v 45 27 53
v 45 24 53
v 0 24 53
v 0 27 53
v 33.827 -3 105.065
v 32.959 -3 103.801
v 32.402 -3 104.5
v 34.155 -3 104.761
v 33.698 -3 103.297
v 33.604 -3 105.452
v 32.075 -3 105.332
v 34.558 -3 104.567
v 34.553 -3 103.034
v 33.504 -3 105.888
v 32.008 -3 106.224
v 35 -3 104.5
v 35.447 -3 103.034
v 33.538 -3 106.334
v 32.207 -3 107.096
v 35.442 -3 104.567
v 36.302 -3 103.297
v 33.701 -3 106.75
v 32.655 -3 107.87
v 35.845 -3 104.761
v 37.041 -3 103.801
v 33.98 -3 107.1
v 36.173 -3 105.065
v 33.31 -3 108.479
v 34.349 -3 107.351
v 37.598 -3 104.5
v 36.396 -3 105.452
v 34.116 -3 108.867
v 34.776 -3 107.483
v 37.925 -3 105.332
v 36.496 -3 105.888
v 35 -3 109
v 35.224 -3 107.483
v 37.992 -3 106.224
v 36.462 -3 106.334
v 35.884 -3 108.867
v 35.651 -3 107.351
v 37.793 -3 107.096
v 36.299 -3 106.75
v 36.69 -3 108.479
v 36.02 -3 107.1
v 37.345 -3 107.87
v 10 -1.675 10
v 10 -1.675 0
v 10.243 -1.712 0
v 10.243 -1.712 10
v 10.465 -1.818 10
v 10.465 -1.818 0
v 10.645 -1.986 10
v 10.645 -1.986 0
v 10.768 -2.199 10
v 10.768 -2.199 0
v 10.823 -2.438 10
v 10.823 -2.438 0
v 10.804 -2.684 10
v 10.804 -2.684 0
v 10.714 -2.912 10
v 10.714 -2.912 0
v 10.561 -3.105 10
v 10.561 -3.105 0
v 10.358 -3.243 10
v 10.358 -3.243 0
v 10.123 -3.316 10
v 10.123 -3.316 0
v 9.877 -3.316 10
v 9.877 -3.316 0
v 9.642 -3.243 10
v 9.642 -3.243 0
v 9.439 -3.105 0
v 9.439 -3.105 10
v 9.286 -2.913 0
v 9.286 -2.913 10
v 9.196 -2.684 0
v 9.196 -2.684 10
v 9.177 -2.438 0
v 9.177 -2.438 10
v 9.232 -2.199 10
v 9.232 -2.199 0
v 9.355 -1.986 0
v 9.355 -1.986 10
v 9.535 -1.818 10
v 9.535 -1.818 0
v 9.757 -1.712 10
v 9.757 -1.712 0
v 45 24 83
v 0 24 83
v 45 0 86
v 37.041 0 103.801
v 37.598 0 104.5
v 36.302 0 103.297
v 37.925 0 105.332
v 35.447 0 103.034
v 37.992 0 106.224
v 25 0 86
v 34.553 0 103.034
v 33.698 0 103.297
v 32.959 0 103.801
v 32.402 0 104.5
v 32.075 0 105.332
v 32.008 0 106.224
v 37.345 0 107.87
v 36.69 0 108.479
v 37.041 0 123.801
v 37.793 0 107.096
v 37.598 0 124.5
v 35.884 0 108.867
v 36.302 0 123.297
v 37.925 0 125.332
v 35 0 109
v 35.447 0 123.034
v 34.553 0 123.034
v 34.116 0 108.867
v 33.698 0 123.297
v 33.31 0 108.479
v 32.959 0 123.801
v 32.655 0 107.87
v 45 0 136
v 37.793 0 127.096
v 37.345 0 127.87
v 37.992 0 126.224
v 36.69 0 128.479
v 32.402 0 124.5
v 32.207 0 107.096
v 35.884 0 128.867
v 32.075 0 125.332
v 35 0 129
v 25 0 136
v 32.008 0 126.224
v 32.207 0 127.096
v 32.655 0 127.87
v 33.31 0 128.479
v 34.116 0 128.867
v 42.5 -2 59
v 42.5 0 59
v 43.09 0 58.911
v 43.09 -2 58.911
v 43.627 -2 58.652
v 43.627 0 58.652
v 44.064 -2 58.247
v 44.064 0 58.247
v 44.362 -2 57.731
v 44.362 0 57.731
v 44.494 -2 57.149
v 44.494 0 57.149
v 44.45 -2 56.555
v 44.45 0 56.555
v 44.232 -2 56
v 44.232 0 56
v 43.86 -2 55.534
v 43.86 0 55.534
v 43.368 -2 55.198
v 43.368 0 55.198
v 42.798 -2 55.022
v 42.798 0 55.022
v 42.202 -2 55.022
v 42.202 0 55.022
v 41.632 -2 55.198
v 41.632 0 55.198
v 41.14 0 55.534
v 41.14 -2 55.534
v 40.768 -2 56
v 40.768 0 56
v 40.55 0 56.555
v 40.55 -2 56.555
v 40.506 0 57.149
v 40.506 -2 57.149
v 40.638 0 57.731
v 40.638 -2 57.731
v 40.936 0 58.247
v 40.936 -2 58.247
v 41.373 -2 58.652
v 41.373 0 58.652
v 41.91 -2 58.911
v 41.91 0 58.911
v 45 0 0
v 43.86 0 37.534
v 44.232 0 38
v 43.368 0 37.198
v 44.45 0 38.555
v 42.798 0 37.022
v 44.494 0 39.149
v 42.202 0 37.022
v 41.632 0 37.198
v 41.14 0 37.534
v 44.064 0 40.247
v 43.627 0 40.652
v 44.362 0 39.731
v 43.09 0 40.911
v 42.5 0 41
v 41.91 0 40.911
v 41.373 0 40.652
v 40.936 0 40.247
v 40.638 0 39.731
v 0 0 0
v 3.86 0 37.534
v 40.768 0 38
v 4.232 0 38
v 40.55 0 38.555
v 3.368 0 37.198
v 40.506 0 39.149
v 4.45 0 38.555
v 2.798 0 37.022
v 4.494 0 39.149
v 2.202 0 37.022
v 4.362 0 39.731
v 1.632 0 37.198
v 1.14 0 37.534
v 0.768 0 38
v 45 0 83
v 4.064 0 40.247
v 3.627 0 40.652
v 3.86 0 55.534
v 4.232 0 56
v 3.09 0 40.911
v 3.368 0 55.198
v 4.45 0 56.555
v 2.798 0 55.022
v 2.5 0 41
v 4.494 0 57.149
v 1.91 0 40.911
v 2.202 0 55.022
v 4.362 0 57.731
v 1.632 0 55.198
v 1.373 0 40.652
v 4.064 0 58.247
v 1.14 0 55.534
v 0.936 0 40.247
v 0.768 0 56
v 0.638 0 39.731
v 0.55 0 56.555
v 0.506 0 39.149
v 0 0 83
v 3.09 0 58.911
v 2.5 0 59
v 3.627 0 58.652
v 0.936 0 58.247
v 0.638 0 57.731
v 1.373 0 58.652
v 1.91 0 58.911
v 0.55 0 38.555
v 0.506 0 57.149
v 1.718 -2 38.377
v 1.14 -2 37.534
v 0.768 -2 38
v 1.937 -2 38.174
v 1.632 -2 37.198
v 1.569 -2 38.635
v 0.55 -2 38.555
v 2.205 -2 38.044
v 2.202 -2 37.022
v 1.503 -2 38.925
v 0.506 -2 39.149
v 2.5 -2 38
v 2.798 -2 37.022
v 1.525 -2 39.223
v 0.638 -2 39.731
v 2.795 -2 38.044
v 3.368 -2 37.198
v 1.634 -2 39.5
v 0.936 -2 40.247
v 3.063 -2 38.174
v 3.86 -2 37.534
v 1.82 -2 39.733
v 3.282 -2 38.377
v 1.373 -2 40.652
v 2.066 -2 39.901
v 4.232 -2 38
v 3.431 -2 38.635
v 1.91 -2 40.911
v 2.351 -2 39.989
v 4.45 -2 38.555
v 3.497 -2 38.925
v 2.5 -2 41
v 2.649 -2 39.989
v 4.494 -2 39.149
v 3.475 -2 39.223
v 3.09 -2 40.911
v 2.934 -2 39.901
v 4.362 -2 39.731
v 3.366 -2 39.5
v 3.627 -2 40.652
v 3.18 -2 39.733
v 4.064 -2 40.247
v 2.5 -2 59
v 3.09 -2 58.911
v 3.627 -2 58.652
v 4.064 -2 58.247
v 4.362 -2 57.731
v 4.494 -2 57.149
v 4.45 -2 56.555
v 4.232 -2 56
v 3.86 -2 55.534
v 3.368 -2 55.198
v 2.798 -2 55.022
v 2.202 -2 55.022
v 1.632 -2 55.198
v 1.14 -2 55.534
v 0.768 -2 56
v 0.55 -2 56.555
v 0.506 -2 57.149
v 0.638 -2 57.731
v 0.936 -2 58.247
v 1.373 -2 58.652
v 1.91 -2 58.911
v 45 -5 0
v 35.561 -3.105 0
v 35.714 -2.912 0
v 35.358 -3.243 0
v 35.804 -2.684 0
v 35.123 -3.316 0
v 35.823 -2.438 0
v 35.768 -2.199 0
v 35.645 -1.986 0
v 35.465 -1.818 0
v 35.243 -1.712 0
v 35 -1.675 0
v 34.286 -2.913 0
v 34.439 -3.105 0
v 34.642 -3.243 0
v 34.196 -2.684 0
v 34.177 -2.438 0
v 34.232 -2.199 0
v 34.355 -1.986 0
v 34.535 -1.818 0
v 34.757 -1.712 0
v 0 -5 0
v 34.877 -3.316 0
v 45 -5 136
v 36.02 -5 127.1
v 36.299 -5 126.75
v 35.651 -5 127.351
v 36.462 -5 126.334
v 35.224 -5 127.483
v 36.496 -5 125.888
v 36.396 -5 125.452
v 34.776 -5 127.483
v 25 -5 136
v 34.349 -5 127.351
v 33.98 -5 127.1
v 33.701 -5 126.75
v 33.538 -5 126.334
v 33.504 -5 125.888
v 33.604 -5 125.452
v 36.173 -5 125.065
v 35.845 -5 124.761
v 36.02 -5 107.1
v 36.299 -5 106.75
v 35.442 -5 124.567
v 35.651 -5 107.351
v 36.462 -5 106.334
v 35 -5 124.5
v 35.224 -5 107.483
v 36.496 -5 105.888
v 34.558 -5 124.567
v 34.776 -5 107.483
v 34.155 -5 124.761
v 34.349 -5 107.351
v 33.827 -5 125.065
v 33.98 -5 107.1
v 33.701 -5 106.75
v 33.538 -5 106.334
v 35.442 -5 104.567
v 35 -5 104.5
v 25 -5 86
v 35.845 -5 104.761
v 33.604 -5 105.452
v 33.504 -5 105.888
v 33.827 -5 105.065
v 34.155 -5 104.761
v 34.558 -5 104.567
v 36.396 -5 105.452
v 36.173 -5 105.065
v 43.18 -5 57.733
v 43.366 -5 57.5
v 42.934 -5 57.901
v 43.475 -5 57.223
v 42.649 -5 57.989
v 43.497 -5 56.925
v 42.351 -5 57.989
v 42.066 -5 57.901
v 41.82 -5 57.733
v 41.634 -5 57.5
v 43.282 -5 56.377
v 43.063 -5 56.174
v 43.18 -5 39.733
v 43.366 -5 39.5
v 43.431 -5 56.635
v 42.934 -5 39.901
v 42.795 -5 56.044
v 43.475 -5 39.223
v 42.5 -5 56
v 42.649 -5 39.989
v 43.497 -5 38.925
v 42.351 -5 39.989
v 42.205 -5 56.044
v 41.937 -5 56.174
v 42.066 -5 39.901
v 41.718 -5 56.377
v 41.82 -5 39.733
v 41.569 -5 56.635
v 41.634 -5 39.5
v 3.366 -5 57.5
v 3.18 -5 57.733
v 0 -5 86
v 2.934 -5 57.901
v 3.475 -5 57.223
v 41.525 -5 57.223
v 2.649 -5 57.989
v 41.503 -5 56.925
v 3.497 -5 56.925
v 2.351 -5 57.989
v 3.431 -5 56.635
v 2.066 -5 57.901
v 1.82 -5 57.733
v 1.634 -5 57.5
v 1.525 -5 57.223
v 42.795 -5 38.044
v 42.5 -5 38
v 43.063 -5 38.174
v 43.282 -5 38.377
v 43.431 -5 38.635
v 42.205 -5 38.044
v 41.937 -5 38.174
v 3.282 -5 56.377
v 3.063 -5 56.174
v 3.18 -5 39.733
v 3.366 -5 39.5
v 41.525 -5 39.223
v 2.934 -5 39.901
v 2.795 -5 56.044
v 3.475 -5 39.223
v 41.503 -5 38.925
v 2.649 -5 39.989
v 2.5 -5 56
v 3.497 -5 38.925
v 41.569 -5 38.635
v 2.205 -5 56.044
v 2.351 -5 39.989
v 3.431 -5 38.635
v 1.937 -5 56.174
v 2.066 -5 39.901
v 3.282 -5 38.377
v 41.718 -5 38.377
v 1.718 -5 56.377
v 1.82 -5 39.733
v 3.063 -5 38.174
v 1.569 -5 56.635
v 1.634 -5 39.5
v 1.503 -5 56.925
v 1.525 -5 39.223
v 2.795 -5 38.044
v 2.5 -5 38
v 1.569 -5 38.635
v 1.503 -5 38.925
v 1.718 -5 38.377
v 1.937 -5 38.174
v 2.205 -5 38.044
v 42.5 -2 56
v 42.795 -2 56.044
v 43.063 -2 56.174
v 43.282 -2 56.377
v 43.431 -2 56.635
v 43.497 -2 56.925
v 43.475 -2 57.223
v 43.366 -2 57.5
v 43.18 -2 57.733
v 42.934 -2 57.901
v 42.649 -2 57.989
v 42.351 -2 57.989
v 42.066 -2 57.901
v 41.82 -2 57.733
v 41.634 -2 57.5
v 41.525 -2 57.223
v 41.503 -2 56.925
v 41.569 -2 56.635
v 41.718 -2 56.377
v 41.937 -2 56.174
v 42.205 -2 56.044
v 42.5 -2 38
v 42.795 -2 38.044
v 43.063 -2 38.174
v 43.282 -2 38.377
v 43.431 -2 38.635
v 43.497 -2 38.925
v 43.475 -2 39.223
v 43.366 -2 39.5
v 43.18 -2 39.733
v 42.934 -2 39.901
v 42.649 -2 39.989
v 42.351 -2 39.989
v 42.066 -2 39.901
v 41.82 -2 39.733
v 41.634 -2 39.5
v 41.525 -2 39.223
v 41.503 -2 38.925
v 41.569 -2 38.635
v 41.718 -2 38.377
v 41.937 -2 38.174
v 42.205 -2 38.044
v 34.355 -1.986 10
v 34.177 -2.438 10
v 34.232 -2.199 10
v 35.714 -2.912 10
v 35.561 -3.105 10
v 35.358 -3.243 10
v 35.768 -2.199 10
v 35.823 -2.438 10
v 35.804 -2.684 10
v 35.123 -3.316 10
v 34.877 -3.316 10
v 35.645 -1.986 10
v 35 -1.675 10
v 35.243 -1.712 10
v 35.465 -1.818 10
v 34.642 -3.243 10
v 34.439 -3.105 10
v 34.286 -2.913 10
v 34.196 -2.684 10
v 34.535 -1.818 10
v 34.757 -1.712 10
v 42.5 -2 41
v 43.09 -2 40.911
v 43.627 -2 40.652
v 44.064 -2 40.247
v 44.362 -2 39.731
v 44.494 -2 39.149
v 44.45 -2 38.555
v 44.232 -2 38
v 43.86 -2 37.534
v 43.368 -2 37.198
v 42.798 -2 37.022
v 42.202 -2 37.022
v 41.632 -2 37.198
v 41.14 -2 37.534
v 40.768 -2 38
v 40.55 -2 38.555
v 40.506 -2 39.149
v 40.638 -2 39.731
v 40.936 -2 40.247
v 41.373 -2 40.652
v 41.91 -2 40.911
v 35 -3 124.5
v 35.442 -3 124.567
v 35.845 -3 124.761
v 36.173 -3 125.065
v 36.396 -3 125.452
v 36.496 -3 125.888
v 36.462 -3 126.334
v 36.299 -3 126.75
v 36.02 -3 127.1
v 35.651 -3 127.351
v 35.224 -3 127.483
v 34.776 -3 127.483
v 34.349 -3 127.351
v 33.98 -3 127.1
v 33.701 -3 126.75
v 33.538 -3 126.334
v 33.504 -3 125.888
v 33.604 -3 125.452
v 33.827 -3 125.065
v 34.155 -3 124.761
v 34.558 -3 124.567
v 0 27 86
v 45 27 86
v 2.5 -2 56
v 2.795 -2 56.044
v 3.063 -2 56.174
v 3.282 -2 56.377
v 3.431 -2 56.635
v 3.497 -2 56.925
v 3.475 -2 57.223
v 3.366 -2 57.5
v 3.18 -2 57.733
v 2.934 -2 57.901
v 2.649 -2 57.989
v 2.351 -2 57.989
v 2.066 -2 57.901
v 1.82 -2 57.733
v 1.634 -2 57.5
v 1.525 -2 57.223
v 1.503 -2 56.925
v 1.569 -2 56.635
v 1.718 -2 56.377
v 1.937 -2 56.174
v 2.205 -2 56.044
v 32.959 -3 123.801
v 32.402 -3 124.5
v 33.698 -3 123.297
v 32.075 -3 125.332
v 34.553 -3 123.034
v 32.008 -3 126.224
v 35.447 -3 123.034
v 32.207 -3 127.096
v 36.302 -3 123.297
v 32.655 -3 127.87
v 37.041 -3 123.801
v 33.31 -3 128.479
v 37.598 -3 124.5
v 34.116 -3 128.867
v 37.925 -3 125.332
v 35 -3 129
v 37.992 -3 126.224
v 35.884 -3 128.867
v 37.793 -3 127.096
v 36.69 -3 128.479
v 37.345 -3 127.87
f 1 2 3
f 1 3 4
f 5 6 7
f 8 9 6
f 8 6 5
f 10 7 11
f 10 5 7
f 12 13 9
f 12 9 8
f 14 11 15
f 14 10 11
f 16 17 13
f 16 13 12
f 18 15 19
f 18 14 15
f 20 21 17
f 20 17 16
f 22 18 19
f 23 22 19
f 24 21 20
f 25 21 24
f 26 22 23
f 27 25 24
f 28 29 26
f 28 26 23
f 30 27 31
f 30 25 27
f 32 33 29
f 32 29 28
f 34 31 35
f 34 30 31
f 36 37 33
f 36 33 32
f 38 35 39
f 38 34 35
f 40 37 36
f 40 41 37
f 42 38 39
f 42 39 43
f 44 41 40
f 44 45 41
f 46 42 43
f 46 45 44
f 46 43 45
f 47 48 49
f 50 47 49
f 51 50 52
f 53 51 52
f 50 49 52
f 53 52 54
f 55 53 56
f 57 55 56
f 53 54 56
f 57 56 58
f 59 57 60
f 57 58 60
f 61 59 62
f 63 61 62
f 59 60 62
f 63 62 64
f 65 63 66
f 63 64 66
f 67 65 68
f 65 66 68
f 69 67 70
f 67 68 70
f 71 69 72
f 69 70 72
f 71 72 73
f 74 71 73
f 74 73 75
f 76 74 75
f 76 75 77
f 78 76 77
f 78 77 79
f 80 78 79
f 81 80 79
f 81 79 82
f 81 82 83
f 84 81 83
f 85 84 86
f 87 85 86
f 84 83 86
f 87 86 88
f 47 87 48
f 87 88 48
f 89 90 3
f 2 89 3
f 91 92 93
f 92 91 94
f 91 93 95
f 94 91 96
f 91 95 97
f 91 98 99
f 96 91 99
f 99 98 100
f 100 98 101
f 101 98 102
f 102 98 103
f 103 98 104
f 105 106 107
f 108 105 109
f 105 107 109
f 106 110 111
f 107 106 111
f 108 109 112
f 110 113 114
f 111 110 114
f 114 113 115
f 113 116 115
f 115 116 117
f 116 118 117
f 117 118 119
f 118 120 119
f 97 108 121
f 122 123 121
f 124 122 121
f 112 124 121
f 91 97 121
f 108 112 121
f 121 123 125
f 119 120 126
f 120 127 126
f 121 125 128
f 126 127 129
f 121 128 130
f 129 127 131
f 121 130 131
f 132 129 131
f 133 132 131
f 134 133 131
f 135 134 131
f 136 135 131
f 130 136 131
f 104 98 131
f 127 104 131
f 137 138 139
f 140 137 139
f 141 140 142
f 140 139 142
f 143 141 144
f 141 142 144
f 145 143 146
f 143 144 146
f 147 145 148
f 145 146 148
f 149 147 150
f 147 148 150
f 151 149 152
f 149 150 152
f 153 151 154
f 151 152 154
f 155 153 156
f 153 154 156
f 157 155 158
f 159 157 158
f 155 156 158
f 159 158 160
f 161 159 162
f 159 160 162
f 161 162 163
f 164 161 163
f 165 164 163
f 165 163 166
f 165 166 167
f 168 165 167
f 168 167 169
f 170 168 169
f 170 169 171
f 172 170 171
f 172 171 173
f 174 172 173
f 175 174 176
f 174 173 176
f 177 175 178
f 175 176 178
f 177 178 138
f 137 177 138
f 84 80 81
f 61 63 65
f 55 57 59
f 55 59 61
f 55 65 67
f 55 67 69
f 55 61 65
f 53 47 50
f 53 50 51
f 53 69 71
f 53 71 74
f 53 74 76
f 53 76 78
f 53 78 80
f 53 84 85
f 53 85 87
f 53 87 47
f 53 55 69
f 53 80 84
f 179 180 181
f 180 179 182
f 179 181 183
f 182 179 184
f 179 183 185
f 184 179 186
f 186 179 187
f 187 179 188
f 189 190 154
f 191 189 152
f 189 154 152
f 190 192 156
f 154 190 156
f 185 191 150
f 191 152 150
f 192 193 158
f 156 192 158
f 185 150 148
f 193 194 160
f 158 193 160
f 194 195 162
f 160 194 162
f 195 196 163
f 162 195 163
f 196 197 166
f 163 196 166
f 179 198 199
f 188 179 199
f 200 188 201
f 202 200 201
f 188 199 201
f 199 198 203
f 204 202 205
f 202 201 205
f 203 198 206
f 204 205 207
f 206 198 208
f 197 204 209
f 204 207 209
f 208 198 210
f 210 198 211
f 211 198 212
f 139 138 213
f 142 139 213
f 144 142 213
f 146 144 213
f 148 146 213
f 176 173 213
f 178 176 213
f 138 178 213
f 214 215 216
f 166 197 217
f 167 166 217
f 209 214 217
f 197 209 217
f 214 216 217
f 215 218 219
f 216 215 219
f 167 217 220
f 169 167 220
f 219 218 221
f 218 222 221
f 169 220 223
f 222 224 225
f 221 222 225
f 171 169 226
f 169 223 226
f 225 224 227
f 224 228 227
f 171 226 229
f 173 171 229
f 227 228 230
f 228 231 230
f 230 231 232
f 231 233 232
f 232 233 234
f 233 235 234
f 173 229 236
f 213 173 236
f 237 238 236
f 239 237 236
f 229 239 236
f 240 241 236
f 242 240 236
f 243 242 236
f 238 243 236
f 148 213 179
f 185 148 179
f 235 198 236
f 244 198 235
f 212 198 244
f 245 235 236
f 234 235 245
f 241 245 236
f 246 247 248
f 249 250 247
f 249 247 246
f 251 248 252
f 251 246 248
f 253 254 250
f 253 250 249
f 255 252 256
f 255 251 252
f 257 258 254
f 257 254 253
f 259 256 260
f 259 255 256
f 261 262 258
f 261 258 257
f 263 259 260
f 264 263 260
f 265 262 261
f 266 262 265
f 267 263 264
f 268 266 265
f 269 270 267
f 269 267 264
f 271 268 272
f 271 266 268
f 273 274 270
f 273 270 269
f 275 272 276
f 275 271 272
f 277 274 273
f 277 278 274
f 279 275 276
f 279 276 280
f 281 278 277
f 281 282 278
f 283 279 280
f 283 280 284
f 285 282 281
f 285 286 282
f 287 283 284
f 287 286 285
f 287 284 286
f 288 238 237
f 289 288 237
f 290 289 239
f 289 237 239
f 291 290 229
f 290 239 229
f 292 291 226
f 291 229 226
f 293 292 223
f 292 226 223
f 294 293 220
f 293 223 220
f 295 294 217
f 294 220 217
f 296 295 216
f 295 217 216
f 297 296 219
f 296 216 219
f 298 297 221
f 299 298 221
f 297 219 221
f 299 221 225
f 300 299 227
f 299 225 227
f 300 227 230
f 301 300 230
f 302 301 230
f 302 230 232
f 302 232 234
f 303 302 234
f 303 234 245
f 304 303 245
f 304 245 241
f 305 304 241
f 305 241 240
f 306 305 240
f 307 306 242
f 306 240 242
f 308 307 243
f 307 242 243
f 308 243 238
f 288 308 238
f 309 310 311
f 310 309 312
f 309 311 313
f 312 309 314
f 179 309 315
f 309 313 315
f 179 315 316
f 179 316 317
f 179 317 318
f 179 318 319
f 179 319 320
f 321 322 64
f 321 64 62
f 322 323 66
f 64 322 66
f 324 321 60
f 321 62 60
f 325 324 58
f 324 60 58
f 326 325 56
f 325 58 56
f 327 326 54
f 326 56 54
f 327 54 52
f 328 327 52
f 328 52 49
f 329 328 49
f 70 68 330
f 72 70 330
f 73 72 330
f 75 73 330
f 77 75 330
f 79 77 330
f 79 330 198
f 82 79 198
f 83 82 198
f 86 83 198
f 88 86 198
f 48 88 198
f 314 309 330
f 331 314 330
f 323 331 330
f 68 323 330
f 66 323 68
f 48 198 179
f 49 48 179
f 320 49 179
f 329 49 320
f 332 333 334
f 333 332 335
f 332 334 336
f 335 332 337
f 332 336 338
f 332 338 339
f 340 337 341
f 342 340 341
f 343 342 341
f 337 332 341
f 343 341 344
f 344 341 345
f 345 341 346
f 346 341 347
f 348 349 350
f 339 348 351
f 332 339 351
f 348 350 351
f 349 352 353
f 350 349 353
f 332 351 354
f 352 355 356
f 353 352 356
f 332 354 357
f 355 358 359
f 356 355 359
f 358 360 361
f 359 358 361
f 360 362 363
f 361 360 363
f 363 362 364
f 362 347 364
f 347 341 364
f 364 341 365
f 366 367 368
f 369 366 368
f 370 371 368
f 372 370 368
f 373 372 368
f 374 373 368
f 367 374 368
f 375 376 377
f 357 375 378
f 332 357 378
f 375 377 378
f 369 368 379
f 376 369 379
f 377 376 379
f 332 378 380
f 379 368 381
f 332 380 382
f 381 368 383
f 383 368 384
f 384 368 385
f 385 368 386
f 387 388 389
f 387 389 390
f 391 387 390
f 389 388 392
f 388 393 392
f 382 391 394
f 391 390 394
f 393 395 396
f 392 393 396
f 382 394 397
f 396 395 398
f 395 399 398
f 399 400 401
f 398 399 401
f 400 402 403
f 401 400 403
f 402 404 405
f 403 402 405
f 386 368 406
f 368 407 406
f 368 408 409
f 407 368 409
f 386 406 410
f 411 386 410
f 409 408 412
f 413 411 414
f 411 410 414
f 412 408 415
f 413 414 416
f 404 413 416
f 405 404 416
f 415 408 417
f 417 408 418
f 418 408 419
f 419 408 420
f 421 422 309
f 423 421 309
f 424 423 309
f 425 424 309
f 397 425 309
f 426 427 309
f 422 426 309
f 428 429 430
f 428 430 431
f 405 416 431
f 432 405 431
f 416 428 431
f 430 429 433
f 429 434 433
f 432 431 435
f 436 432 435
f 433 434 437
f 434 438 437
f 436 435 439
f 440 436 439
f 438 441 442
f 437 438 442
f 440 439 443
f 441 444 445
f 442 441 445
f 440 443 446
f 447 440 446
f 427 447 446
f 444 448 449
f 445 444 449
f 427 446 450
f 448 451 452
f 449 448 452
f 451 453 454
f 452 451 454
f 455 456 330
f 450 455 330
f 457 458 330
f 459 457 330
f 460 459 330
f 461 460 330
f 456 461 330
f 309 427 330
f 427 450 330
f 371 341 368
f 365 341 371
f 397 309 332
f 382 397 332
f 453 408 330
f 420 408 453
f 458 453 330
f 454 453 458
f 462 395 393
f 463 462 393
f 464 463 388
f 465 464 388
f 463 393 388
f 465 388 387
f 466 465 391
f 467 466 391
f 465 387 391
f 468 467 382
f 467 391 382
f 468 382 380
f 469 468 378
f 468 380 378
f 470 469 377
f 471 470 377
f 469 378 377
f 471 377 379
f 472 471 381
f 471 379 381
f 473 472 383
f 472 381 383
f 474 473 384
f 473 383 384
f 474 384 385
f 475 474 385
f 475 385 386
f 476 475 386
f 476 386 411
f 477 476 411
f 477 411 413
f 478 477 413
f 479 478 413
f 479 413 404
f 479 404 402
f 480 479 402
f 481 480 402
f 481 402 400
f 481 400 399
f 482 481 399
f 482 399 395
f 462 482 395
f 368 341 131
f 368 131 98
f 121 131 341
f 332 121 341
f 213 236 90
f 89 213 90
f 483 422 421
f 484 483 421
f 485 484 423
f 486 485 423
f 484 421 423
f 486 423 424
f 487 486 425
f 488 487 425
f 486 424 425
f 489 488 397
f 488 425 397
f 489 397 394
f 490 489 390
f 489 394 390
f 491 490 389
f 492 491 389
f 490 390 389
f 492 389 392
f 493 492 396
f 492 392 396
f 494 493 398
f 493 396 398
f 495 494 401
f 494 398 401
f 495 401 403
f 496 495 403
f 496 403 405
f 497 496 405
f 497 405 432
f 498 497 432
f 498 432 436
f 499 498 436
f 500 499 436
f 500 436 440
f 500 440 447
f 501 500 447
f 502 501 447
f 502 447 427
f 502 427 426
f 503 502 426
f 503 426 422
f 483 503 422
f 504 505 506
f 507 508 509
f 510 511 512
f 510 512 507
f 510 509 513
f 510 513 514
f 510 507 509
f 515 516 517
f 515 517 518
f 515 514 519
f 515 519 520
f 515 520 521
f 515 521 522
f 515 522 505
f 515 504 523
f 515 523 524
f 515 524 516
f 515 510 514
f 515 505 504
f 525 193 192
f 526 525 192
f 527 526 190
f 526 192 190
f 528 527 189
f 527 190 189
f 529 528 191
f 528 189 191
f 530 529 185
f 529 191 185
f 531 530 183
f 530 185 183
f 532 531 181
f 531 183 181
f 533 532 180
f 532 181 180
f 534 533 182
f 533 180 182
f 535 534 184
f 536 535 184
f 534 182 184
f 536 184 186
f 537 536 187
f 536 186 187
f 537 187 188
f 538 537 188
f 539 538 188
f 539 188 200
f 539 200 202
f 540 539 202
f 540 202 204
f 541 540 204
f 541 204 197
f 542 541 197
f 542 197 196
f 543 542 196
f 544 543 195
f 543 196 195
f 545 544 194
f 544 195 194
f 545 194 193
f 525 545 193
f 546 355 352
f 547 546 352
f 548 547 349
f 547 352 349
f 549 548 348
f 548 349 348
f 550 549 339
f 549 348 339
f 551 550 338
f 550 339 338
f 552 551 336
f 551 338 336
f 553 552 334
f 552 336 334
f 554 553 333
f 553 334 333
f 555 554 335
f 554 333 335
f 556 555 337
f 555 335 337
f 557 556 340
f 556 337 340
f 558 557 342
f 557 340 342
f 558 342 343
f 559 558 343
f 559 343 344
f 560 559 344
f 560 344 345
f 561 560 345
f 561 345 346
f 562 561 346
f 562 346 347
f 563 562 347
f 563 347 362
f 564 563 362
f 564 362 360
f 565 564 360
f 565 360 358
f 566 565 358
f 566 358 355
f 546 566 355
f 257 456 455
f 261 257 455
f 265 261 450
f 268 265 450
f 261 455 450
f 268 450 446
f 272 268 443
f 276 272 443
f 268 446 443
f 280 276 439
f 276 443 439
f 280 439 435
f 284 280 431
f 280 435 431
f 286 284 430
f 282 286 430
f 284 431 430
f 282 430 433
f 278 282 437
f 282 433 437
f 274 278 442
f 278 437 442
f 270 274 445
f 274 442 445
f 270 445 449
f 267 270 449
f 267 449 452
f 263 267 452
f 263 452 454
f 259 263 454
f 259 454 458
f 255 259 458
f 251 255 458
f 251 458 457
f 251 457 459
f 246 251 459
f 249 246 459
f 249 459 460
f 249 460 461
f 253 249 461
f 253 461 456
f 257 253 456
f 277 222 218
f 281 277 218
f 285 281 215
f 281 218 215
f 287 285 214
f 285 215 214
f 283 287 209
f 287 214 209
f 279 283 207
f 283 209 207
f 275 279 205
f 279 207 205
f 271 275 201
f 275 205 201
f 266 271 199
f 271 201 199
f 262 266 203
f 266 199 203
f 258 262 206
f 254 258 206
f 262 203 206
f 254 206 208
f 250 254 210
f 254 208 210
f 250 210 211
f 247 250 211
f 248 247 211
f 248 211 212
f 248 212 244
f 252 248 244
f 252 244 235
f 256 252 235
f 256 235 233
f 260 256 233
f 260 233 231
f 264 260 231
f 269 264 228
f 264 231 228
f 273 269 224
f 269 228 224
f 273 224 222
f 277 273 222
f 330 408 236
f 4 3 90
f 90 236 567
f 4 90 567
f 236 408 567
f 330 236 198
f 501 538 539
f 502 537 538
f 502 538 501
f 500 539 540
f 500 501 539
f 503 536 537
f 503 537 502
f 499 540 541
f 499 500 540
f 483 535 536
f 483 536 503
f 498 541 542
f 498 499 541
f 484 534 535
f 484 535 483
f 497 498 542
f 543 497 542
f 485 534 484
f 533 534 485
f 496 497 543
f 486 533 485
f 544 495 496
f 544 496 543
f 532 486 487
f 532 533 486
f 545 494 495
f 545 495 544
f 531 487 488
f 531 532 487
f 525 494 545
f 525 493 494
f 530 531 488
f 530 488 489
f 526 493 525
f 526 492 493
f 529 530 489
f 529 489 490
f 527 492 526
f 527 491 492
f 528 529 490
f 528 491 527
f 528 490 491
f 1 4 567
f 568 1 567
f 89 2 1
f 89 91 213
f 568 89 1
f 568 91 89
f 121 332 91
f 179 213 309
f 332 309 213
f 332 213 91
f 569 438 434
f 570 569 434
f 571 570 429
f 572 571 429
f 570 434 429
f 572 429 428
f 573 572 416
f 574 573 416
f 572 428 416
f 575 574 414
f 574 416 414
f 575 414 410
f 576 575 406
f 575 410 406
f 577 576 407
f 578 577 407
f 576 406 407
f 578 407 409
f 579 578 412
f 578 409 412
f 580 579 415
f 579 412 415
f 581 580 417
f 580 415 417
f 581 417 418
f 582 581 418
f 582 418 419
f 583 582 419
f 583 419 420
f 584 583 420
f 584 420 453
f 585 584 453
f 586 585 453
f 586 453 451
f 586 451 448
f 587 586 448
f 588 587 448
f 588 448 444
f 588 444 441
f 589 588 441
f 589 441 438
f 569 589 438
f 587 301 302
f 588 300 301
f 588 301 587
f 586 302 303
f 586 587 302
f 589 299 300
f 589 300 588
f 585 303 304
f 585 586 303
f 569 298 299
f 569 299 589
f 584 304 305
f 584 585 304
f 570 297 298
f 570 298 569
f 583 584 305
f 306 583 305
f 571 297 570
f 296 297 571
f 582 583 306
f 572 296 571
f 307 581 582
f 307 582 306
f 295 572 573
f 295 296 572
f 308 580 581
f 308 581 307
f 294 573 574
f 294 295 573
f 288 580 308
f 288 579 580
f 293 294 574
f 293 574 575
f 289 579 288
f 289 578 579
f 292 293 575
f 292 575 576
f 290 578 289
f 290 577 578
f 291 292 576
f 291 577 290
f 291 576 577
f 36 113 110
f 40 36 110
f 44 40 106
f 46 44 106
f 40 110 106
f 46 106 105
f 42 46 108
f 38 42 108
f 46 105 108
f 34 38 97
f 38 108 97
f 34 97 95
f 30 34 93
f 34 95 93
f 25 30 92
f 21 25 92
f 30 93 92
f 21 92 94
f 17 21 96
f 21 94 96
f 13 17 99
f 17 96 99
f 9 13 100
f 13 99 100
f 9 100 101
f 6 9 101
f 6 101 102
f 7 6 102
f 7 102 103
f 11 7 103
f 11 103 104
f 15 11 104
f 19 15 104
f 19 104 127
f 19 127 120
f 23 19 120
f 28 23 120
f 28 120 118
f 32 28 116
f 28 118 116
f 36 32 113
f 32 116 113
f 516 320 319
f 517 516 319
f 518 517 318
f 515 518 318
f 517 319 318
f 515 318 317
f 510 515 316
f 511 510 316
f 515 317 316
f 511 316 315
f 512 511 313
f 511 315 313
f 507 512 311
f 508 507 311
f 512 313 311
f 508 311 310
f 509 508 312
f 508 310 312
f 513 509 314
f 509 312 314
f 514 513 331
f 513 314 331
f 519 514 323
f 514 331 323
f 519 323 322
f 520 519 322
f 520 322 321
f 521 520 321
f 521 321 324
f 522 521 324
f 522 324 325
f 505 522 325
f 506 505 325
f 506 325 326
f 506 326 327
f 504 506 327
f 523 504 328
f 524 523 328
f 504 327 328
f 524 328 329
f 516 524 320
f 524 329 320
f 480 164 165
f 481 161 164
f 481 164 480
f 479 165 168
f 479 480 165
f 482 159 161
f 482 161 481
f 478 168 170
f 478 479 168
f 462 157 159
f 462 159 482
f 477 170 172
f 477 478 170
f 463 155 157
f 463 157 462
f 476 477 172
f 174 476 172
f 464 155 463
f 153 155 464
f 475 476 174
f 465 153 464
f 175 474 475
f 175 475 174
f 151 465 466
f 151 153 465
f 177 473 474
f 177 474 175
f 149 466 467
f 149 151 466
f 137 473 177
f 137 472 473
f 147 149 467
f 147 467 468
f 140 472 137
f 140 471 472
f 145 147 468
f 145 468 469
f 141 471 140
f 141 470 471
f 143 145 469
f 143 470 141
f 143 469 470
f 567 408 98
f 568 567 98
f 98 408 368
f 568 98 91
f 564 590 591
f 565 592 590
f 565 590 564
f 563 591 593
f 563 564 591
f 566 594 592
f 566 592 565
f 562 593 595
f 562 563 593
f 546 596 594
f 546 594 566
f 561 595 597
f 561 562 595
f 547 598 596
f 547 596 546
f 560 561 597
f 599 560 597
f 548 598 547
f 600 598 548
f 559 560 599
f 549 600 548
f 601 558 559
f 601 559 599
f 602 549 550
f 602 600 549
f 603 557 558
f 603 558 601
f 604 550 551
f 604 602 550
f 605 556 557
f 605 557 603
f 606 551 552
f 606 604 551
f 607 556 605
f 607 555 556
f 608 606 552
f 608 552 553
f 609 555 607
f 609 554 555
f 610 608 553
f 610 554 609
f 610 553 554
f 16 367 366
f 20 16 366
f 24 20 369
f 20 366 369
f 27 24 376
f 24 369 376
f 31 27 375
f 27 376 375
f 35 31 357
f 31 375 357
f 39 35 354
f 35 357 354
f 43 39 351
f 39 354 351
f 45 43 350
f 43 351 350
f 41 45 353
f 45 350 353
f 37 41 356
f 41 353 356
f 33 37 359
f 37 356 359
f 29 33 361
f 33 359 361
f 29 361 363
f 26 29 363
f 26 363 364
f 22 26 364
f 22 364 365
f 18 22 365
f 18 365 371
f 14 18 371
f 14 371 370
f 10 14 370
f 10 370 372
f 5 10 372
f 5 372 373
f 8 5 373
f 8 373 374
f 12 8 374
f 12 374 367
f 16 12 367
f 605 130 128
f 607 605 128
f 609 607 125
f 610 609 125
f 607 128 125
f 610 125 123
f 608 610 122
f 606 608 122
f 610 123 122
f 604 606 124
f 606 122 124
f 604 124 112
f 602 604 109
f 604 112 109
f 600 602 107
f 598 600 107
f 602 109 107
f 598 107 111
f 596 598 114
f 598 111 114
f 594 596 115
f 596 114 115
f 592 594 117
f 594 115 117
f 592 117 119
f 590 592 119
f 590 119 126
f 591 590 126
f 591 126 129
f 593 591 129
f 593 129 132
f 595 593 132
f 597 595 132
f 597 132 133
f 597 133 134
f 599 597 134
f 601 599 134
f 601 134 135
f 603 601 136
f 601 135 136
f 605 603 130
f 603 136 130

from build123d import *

# Parameters (mm, degrees)
PAD_DEPTH       = 45
SKETCH001_R     = 1
POCKET_DEPTH    = 5
SKETCH002_R     = 0.825
POCKET001_DEPTH = 10
SKETCH004_R     = 1.5
POCKET003_DEPTH = 5
SKETCH005_W     = 50
SKETCH005_H     = 25
POCKET004_DEPTH = 5
SKETCH006_R     = 2
POCKET005_DEPTH = 2
SKETCH007_R     = 3
POCKET006_DEPTH = 3


with BuildPart() as part:
    # Sketch → Pad (new body)
    with BuildSketch(Plane.YZ):
        Polygon((0, 0), (0, 83), (24, 83), (24, 53), (27, 53), (27, 86), (0, 86), (0, 136), (-5, 136), (-5, 0), align=None)
    extrude(amount=PAD_DEPTH)

    # Sketch001 (on Face1 of Pad) → Pocket (cut)
    with BuildSketch(Plane(origin=(0, -5, 0), x_dir=(0, 0, -1), z_dir=(0, -1, 0))):
        with Locations((-57, 42.5)):
            Circle(SKETCH001_R)
        with Locations((-39, 42.5)):
            Circle(SKETCH001_R)
        with Locations((-57, 2.5)):
            Circle(SKETCH001_R)
        with Locations((-39, 2.5)):
            Circle(SKETCH001_R)
    extrude(amount=-POCKET_DEPTH, mode=Mode.SUBTRACT)

    # Sketch002 (on Face5 of Pocket) → Pocket001 (cut)
    with BuildSketch(Plane.YX):
        with Locations((-2.5, 35)):
            Circle(SKETCH002_R)
        with Locations((-2.5, 10)):
            Circle(SKETCH002_R)
    extrude(amount=-POCKET001_DEPTH, mode=Mode.SUBTRACT)

    # Sketch004 → Pocket003 (cut)
    with BuildSketch(Plane(origin=(0, -5, 0), x_dir=(0, 0, -1), z_dir=(0, -1, 0))):
        with Locations((-126, 35)):
            Circle(SKETCH004_R)
        with Locations((-106, 35)):
            Circle(SKETCH004_R)
    extrude(amount=-POCKET003_DEPTH, mode=Mode.SUBTRACT)

    # Sketch005 (on Face1 of Pocket003) → Pocket004 (cut)
    with BuildSketch(Plane(origin=(0, -5, 0), x_dir=(0, 0, -1), z_dir=(0, -1, 0))):
        with Locations((-111, 12.5)):
            Rectangle(SKETCH005_W, SKETCH005_H)
    extrude(amount=-POCKET004_DEPTH, mode=Mode.SUBTRACT)

    # Sketch006 (on Face20 of Pocket004) → Pocket005 (cut)
    with BuildSketch(Plane.ZX):
        with Locations((39, 42.5)):
            Circle(SKETCH006_R)
        with Locations((57, 42.5)):
            Circle(SKETCH006_R)
        with Locations((39, 2.5)):
            Circle(SKETCH006_R)
        with Locations((57, 2.5)):
            Circle(SKETCH006_R)
    extrude(amount=-POCKET005_DEPTH, mode=Mode.SUBTRACT)

    # Sketch007 (on Face14 of Pocket005) → Pocket006 (cut)
    with BuildSketch(Plane.ZX):
        with Locations((106, 35)):
            Circle(SKETCH007_R)
        with Locations((126, 35)):
            Circle(SKETCH007_R)
    extrude(amount=-POCKET006_DEPTH, mode=Mode.SUBTRACT)


solid = part.part
